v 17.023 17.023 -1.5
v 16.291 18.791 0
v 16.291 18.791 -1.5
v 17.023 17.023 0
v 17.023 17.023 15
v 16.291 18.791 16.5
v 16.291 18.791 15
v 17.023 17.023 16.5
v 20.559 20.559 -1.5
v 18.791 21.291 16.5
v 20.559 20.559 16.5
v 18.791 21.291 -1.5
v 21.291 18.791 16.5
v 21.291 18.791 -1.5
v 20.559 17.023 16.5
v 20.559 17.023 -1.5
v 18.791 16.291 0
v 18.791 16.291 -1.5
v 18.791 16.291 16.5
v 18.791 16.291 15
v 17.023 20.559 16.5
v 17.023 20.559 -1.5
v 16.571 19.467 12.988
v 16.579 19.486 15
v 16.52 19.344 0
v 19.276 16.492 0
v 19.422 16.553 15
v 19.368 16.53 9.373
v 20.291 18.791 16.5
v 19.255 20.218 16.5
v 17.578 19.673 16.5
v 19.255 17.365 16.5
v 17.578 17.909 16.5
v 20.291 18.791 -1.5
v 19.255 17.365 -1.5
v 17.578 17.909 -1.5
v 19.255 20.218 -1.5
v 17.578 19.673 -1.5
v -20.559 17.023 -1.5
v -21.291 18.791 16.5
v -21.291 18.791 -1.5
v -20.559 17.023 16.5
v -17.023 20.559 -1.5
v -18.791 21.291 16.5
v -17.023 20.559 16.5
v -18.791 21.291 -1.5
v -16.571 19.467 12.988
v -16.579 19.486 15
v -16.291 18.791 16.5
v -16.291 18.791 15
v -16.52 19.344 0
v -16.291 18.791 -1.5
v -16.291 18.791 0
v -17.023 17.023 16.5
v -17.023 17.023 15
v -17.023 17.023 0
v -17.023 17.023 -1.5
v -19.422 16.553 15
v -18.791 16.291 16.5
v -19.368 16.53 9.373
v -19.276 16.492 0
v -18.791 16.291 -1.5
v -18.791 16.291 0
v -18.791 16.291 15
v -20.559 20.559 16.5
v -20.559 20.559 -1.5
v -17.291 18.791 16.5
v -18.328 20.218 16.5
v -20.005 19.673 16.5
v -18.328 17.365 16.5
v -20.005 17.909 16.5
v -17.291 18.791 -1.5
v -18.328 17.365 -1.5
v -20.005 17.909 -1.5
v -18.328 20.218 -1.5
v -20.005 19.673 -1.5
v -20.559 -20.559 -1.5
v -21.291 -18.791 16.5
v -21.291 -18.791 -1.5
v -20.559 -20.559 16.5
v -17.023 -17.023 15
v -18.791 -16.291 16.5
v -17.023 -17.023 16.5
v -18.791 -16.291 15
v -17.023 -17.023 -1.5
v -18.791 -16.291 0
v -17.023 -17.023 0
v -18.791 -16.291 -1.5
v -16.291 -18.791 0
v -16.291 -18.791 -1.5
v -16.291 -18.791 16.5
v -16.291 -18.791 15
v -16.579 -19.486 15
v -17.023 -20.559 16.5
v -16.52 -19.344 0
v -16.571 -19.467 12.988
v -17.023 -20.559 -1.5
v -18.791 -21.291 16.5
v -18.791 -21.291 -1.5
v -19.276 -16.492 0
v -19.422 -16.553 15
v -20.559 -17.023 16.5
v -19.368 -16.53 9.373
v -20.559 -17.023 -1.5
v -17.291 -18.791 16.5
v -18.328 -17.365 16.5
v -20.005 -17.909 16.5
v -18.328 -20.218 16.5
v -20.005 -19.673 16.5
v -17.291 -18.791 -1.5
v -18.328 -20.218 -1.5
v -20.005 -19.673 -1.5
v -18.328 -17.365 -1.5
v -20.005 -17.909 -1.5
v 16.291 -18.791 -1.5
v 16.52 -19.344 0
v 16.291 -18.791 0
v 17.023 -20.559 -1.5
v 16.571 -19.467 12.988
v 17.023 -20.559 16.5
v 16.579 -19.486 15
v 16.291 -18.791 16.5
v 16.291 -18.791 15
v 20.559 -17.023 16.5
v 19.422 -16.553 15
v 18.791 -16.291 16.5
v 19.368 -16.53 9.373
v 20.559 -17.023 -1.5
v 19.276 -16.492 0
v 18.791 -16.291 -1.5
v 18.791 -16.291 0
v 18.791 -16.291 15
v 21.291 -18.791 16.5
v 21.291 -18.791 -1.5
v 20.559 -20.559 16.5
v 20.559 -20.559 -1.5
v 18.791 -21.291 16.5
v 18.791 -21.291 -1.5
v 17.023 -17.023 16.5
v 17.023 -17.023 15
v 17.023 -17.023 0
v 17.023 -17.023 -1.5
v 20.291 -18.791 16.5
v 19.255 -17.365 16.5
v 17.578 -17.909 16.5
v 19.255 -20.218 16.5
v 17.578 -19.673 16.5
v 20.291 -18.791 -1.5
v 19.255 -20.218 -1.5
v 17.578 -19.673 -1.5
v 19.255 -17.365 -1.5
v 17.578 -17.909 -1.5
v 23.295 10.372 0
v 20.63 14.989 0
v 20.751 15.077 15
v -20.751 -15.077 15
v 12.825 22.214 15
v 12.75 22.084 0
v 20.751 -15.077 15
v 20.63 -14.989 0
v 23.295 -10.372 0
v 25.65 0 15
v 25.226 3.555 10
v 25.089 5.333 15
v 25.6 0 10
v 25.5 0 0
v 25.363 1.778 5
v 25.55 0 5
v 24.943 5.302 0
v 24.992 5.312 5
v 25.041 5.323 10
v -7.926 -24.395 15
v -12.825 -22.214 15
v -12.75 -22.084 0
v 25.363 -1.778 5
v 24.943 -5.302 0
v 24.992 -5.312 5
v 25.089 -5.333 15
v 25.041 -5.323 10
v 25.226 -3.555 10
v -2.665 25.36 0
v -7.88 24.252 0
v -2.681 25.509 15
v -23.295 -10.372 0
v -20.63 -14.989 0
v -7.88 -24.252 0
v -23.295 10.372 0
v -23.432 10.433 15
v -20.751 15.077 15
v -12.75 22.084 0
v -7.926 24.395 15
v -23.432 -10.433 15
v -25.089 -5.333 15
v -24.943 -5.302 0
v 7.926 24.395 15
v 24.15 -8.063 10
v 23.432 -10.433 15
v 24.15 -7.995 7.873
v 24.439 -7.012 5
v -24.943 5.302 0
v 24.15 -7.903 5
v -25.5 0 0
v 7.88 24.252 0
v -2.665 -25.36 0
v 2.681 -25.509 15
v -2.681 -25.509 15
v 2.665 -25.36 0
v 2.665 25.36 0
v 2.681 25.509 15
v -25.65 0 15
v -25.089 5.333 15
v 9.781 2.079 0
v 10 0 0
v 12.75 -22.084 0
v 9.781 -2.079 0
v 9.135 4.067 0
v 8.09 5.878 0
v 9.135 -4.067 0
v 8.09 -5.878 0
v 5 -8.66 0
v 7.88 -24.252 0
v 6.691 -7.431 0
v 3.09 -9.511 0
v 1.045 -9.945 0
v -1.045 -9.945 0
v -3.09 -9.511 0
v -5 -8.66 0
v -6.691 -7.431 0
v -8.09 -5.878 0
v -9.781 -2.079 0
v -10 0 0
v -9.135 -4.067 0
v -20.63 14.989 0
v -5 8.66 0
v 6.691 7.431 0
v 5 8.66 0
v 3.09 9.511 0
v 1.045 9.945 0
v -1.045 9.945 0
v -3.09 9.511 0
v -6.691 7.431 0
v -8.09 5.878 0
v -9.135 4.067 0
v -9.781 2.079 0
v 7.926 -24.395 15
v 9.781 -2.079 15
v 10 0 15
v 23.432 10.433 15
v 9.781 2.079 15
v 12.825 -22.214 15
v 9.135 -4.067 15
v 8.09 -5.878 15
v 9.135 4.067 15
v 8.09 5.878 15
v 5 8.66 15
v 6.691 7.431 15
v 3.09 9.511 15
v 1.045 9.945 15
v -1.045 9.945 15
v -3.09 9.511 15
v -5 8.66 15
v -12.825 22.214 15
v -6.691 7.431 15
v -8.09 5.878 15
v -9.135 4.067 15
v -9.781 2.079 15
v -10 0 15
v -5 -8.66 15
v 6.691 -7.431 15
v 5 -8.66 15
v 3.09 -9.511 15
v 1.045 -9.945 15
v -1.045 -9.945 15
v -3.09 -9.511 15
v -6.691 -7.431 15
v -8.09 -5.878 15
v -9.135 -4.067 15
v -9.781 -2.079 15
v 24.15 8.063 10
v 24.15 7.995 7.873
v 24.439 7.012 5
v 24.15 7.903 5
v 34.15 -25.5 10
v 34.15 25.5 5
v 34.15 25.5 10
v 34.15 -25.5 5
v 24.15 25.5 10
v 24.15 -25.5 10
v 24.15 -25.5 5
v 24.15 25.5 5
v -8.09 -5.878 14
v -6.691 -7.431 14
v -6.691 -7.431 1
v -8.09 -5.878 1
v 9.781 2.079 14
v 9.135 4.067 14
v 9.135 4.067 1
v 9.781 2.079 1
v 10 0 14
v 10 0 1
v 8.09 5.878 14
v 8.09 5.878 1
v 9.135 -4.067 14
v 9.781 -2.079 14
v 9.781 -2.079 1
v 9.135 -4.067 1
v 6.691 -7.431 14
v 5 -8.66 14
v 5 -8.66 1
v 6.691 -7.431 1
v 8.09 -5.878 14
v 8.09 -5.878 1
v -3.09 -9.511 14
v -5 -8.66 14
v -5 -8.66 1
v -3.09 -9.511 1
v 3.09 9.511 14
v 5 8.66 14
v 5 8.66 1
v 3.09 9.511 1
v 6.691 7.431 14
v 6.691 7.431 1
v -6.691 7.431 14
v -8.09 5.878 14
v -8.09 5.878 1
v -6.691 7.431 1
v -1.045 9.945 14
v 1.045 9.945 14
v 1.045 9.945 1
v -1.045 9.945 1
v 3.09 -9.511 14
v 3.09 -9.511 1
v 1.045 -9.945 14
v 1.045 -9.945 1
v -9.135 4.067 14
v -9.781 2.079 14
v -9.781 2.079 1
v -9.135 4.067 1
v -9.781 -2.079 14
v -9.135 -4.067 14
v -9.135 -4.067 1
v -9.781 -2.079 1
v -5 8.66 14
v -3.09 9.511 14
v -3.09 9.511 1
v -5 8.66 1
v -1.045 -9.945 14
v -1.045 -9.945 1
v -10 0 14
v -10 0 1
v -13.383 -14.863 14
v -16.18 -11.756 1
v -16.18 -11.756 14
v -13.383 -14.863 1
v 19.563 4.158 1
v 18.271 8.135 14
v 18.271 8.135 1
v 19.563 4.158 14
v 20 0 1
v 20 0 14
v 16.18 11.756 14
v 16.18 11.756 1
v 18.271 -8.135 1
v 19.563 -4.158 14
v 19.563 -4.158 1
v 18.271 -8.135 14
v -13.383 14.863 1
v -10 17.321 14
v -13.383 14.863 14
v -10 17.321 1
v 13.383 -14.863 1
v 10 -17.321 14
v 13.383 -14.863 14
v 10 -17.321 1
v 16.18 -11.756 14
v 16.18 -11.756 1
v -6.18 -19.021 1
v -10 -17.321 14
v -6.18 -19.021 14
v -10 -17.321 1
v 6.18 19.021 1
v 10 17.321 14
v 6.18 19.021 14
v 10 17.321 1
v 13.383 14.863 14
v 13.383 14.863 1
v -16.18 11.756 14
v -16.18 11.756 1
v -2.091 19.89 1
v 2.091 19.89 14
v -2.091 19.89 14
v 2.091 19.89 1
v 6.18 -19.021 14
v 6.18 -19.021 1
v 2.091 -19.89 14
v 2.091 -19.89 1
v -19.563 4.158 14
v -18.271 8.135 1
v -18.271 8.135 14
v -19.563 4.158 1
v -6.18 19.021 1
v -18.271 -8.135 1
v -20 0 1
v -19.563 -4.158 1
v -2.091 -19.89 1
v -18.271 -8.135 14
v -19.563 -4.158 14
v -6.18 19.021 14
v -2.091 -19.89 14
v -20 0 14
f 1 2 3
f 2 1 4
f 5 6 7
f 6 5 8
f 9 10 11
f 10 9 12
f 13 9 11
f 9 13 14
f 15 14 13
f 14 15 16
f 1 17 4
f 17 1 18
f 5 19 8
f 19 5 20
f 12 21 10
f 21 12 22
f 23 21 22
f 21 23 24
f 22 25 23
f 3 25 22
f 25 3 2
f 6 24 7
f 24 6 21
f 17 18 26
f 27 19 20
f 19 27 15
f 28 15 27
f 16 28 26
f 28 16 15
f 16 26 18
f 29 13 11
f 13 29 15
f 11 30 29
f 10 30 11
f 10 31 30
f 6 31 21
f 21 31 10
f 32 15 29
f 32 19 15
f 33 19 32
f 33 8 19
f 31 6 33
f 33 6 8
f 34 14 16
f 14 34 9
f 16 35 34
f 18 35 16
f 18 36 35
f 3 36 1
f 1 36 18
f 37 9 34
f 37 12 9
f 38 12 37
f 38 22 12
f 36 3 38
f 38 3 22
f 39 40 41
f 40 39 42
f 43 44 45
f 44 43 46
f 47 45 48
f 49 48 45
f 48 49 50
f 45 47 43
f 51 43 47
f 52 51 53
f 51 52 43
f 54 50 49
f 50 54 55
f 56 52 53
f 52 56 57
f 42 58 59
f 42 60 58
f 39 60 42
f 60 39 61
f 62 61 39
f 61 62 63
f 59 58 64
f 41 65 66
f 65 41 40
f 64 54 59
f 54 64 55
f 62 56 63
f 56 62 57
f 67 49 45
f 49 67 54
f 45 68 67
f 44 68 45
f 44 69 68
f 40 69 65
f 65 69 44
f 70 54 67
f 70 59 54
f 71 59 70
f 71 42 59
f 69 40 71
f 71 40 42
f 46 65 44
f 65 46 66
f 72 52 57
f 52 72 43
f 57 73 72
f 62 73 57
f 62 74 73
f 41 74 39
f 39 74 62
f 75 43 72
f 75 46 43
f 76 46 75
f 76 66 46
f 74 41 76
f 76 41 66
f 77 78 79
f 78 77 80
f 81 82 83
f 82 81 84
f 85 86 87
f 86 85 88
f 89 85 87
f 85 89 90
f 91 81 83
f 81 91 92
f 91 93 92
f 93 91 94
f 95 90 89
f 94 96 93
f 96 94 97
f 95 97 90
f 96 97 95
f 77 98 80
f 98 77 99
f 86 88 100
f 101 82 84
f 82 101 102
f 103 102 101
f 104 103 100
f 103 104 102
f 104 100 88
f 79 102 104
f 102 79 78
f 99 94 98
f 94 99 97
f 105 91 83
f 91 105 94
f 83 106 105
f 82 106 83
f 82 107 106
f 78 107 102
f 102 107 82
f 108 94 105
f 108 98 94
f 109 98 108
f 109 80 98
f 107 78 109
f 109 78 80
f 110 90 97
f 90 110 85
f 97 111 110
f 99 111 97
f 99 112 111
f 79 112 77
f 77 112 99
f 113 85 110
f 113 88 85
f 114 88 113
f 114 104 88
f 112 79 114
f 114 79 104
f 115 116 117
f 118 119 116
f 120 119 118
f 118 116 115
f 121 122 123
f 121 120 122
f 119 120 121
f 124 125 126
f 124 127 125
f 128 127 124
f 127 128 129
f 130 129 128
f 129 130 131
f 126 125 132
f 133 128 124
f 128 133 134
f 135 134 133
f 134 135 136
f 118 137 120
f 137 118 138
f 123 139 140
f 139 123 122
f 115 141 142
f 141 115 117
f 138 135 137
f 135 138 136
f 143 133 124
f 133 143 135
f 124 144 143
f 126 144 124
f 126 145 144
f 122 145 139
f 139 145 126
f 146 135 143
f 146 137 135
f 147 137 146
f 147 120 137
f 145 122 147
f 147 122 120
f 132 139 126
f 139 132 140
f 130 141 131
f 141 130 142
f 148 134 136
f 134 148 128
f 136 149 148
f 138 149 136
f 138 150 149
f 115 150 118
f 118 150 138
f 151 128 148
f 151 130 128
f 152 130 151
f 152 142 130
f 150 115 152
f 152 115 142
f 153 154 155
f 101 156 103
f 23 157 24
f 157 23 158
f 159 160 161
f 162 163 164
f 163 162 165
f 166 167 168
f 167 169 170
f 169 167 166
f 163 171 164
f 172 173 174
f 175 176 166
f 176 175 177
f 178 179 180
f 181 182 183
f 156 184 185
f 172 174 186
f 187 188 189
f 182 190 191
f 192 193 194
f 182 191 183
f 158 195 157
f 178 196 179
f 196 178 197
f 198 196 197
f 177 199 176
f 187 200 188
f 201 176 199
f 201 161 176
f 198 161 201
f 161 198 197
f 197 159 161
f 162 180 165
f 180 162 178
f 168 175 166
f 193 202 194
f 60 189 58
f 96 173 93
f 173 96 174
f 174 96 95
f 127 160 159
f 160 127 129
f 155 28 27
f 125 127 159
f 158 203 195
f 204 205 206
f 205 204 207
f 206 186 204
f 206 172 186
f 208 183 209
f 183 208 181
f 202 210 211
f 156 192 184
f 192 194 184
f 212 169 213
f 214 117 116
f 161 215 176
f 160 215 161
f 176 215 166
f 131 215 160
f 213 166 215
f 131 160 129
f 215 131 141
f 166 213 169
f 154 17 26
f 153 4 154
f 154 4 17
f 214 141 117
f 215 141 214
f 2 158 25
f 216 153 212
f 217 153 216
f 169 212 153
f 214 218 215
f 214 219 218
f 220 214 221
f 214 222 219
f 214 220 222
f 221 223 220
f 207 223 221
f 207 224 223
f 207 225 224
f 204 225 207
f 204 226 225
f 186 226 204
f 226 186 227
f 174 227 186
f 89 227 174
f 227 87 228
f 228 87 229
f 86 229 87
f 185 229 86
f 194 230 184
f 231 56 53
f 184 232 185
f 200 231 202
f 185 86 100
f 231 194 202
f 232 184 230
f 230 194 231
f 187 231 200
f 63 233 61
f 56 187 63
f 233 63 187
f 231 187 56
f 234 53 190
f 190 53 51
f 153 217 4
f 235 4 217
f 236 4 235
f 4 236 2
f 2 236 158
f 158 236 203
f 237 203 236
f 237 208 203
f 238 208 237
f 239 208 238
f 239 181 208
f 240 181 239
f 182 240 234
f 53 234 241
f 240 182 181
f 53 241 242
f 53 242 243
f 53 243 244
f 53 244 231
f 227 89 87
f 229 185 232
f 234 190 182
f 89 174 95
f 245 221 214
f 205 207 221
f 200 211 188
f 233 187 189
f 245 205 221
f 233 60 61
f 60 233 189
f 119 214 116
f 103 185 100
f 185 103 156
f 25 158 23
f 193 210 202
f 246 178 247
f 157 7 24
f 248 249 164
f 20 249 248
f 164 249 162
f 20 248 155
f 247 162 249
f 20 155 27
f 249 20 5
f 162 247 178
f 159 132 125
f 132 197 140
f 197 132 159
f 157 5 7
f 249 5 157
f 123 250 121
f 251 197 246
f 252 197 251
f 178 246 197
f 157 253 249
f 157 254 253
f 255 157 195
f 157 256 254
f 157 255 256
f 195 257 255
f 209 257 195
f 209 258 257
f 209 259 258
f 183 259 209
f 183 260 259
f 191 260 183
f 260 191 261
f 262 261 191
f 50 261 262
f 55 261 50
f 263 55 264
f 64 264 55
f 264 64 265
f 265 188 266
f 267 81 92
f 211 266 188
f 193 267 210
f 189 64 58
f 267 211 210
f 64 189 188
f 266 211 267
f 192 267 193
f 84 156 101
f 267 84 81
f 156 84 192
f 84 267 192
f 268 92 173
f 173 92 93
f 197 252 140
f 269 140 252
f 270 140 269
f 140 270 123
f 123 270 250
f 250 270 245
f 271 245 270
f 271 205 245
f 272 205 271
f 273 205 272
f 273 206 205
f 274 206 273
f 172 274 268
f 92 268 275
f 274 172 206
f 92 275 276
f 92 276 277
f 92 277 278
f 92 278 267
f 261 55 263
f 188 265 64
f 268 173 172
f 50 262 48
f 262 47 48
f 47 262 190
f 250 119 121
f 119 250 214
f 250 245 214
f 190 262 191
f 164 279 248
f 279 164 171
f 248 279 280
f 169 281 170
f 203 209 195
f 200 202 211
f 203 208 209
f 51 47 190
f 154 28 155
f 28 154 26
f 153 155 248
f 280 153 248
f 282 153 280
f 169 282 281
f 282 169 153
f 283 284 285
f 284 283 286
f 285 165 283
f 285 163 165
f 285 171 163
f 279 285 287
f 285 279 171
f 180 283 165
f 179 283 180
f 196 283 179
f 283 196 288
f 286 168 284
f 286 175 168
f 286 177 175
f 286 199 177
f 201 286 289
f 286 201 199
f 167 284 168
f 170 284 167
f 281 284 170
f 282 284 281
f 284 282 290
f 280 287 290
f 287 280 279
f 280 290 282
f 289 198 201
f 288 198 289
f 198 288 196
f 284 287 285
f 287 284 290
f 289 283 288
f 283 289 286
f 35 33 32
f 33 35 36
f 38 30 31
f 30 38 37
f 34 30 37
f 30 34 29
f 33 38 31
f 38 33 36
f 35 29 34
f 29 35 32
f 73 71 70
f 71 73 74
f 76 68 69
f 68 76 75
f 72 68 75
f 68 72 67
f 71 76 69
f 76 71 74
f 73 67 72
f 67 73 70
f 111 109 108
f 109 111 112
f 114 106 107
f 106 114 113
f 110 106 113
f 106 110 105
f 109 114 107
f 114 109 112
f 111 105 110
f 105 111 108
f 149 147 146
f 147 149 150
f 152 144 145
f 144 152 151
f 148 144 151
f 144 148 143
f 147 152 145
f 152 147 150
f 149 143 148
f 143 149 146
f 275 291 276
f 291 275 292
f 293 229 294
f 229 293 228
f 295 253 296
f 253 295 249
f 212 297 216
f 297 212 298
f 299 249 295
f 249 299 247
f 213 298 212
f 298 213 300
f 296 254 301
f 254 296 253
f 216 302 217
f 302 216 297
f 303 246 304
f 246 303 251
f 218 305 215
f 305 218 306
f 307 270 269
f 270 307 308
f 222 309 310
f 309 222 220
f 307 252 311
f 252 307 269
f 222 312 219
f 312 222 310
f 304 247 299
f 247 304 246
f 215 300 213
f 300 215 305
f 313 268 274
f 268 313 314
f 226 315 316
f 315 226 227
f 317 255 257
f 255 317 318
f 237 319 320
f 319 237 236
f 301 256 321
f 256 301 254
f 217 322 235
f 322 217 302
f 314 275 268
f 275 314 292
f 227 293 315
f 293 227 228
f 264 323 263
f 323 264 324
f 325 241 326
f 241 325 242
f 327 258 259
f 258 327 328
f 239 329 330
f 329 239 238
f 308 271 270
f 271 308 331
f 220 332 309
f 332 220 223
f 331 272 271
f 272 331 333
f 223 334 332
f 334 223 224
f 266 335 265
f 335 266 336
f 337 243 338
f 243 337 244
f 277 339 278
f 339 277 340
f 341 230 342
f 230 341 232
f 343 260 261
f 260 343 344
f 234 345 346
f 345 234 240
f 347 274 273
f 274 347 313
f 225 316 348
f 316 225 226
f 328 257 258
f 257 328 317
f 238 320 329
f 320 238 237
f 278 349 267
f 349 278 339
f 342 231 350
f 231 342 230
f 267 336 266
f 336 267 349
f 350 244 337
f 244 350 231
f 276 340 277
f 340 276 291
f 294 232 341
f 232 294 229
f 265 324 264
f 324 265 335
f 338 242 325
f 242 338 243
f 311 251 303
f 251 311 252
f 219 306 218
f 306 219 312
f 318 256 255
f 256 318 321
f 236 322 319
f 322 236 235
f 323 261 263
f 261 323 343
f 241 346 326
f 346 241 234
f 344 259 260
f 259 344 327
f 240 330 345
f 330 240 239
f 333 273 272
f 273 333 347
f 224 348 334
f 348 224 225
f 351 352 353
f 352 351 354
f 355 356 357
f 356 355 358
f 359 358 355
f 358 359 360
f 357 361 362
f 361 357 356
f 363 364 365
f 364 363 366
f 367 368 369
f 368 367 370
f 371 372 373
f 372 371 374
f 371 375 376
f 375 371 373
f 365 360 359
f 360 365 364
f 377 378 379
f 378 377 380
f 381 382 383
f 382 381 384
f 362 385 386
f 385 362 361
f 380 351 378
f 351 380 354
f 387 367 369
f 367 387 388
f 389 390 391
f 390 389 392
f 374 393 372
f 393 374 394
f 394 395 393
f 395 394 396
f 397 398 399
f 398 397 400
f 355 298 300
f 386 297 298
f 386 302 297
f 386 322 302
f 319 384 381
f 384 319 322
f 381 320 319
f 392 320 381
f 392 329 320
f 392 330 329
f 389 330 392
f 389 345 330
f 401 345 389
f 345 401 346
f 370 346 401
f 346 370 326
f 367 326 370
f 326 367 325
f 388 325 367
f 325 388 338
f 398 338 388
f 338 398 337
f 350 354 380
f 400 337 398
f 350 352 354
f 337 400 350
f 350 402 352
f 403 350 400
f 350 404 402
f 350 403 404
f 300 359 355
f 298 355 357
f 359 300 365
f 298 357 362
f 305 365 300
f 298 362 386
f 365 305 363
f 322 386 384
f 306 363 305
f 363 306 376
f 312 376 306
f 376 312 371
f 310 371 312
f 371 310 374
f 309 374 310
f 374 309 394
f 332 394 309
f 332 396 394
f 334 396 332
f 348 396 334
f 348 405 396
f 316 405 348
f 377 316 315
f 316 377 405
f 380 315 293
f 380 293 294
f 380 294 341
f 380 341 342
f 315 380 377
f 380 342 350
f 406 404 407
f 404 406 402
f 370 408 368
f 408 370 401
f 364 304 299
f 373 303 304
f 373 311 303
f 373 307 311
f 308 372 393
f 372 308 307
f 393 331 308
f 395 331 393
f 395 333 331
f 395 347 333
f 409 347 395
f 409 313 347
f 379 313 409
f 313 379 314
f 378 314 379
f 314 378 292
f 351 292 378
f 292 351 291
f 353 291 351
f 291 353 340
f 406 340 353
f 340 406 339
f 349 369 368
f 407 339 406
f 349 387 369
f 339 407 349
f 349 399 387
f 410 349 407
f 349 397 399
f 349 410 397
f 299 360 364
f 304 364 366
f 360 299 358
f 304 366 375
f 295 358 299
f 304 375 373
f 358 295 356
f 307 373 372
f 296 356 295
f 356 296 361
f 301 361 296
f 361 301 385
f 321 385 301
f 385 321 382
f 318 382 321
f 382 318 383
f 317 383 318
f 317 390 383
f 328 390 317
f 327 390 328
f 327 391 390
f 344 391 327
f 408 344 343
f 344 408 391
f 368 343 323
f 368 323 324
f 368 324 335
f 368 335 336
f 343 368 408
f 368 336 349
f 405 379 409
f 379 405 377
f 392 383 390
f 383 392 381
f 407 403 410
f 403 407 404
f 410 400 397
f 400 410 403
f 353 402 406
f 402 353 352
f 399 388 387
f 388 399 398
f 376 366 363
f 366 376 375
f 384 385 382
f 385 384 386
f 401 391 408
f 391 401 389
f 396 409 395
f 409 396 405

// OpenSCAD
// Parameters
volute_length = 51.3;
volute_width  = 51.0;
volute_height = 15.0;

inlet_diameter  = 20.0;
outlet_width    = 10.0;
outlet_height   = 5.0;

impeller_diameter = 40.0;
impeller_height   = 10.0;

mounting_hole_diameter = 3.0;
mounting_hole_spacing  = 45.0;

// Connectivity/robustness
overlap = 1.5;          // 1–2mm overlap to guarantee attachment
lug_d   = 5.0;          // outer lug diameter (standoff OD)

// Main assembly
module blower_fan() {
    difference() {
        union() {
            volute_casing();
            outlet_duct();      // solid feature
            mounting_lugs();    // FIXED: now guaranteed to intersect the body
        }
        inlet_bore();
        impeller_rotor();
        screw_holes();
    }
}

// Volute casing
module volute_casing() {
    translate([0, 0, volute_height/2])
        cylinder(h = volute_height, d1 = volute_width, d2 = volute_length, center = true);
}

// Inlet bore (subtracted)
module inlet_bore() {
    translate([0, 0, volute_height/2])
        cylinder(h = volute_height + 2*overlap, d = inlet_diameter, center = true);
}

// Outlet duct (solid) - overlaps into volute
module outlet_duct() {
    translate([volute_length/2 + outlet_width/2 - overlap, 0, volute_height/2])
        cube([outlet_width, volute_width, outlet_height], center = true);
}

// Impeller rotor (subtracted cavity)
module impeller_rotor() {
    translate([0, 0, volute_height/2])
        cylinder(h = impeller_height + 2*overlap, d = impeller_diameter, center = true);
}

// Mounting lugs (FIXED: attach to volute with guaranteed overlap)
// Previous approach could still miss the volute because it assumed a circular OD.
// Here we compute the volute's XY boundary at each lug angle using the ellipse
// formed by the frustum's end diameters (d2=volute_length, d1=volute_width).
module mounting_lugs() {
    a = volute_length/2;   // semi-axis in X
    b = volute_width/2;    // semi-axis in Y
    lug_r = lug_d/2;

    // Use the original "four corners" directions (45°, 135°, 225°, 315°)
    for (ang = [45, 135, 225, 315]) {
        // Ellipse radius in direction ang:
        // r(θ) = 1 / sqrt((cosθ/a)^2 + (sinθ/b)^2)
        r_dir = 1 / sqrt( pow(cos(ang)/a, 2) + pow(sin(ang)/b, 2) );

        // Place lug center so its inner edge penetrates the volute by `overlap`
        // center distance = r_dir + lug_r - overlap
        r_center = r_dir + lug_r - overlap;

        translate([r_center*cos(ang), r_center*sin(ang), volute_height/2])
            cylinder(h = volute_height + 2*overlap, d = lug_d, center = true);
    }
}

// Screw holes (subtracted) - match lug placement exactly
module screw_holes() {
    a = volute_length/2;
    b = volute_width/2;
    lug_r = lug_d/2;

    for (ang = [45, 135, 225, 315]) {
        r_dir = 1 / sqrt( pow(cos(ang)/a, 2) + pow(sin(ang)/b, 2) );
        r_center = r_dir + lug_r - overlap;

        translate([r_center*cos(ang), r_center*sin(ang), volute_height/2])
            cylinder(h = volute_height + 4*overlap, d = mounting_hole_diameter, center = true);
    }
}

// Render the blower fan
blower_fan();
